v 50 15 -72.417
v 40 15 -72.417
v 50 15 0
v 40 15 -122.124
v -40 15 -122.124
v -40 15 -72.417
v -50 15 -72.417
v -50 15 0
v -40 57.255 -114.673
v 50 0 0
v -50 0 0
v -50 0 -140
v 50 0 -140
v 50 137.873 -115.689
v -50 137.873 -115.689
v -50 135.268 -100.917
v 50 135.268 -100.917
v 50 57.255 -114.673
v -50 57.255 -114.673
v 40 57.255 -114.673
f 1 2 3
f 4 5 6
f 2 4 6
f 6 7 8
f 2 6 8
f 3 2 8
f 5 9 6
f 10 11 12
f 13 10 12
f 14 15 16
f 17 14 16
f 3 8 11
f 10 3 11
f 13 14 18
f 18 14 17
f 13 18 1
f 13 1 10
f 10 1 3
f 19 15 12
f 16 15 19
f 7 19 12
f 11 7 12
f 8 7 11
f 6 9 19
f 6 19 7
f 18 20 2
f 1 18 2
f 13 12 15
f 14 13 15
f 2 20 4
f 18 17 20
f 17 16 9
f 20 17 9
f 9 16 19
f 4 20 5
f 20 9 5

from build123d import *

# Parameters (mm, degrees)
BOSS_EXTRUDE1_DEPTH      = 50
BOSS_EXTRUDE1_DEPTH_BACK = 50
RIB1_REACH               = 222.474
SKETCH3_WALL_W           = 502.70716346
SKETCH3_WALL_H           = 10


with BuildPart() as part:
    # Sketch1 → Boss-Extrude1 (new, two sides: drawn at the far end of the back side and taken through both)
    with BuildSketch(Plane(origin=(0, 0, 0), x_dir=(0, 0, -1), z_dir=(1, 0, 0)).offset(-BOSS_EXTRUDE1_DEPTH_BACK)):
        Polygon((0, 0), (140, 0), (115.689255127, 137.873085422), (100.917138831, 135.268362757), (122.123696111, 15), (0, 15), align=None)
    extrude(amount=BOSS_EXTRUDE1_DEPTH + BOSS_EXTRUDE1_DEPTH_BACK)

    # Sketch3 wall → Rib1 (add, up to next)
    with BuildSketch(Plane(origin=(-50, 36.127729317, -93.545189355), x_dir=(0, -0.707106781187, 0.707106781187), z_dir=(0, 0.707106781187, 0.707106781187)), mode=Mode.PRIVATE) as rib1_sk1:
        with Locations((0, 5)):
            Rectangle(SKETCH3_WALL_W, SKETCH3_WALL_H)
    rib1_tool1 = extrude(rib1_sk1.sketch, amount=-RIB1_REACH, mode=Mode.PRIVATE) - part.part
    rib1 = rib1_tool1.solids().sort_by_distance((-50, 36.127729317, -93.545189355))[0]
    add(rib1)

    # Mirror1: Rib1 across plane
    add(rib1.mirror(Plane(origin=(0, 0, 0), x_dir=(0, 0, 1), z_dir=(1, 0, 0))))


solid = part.part
